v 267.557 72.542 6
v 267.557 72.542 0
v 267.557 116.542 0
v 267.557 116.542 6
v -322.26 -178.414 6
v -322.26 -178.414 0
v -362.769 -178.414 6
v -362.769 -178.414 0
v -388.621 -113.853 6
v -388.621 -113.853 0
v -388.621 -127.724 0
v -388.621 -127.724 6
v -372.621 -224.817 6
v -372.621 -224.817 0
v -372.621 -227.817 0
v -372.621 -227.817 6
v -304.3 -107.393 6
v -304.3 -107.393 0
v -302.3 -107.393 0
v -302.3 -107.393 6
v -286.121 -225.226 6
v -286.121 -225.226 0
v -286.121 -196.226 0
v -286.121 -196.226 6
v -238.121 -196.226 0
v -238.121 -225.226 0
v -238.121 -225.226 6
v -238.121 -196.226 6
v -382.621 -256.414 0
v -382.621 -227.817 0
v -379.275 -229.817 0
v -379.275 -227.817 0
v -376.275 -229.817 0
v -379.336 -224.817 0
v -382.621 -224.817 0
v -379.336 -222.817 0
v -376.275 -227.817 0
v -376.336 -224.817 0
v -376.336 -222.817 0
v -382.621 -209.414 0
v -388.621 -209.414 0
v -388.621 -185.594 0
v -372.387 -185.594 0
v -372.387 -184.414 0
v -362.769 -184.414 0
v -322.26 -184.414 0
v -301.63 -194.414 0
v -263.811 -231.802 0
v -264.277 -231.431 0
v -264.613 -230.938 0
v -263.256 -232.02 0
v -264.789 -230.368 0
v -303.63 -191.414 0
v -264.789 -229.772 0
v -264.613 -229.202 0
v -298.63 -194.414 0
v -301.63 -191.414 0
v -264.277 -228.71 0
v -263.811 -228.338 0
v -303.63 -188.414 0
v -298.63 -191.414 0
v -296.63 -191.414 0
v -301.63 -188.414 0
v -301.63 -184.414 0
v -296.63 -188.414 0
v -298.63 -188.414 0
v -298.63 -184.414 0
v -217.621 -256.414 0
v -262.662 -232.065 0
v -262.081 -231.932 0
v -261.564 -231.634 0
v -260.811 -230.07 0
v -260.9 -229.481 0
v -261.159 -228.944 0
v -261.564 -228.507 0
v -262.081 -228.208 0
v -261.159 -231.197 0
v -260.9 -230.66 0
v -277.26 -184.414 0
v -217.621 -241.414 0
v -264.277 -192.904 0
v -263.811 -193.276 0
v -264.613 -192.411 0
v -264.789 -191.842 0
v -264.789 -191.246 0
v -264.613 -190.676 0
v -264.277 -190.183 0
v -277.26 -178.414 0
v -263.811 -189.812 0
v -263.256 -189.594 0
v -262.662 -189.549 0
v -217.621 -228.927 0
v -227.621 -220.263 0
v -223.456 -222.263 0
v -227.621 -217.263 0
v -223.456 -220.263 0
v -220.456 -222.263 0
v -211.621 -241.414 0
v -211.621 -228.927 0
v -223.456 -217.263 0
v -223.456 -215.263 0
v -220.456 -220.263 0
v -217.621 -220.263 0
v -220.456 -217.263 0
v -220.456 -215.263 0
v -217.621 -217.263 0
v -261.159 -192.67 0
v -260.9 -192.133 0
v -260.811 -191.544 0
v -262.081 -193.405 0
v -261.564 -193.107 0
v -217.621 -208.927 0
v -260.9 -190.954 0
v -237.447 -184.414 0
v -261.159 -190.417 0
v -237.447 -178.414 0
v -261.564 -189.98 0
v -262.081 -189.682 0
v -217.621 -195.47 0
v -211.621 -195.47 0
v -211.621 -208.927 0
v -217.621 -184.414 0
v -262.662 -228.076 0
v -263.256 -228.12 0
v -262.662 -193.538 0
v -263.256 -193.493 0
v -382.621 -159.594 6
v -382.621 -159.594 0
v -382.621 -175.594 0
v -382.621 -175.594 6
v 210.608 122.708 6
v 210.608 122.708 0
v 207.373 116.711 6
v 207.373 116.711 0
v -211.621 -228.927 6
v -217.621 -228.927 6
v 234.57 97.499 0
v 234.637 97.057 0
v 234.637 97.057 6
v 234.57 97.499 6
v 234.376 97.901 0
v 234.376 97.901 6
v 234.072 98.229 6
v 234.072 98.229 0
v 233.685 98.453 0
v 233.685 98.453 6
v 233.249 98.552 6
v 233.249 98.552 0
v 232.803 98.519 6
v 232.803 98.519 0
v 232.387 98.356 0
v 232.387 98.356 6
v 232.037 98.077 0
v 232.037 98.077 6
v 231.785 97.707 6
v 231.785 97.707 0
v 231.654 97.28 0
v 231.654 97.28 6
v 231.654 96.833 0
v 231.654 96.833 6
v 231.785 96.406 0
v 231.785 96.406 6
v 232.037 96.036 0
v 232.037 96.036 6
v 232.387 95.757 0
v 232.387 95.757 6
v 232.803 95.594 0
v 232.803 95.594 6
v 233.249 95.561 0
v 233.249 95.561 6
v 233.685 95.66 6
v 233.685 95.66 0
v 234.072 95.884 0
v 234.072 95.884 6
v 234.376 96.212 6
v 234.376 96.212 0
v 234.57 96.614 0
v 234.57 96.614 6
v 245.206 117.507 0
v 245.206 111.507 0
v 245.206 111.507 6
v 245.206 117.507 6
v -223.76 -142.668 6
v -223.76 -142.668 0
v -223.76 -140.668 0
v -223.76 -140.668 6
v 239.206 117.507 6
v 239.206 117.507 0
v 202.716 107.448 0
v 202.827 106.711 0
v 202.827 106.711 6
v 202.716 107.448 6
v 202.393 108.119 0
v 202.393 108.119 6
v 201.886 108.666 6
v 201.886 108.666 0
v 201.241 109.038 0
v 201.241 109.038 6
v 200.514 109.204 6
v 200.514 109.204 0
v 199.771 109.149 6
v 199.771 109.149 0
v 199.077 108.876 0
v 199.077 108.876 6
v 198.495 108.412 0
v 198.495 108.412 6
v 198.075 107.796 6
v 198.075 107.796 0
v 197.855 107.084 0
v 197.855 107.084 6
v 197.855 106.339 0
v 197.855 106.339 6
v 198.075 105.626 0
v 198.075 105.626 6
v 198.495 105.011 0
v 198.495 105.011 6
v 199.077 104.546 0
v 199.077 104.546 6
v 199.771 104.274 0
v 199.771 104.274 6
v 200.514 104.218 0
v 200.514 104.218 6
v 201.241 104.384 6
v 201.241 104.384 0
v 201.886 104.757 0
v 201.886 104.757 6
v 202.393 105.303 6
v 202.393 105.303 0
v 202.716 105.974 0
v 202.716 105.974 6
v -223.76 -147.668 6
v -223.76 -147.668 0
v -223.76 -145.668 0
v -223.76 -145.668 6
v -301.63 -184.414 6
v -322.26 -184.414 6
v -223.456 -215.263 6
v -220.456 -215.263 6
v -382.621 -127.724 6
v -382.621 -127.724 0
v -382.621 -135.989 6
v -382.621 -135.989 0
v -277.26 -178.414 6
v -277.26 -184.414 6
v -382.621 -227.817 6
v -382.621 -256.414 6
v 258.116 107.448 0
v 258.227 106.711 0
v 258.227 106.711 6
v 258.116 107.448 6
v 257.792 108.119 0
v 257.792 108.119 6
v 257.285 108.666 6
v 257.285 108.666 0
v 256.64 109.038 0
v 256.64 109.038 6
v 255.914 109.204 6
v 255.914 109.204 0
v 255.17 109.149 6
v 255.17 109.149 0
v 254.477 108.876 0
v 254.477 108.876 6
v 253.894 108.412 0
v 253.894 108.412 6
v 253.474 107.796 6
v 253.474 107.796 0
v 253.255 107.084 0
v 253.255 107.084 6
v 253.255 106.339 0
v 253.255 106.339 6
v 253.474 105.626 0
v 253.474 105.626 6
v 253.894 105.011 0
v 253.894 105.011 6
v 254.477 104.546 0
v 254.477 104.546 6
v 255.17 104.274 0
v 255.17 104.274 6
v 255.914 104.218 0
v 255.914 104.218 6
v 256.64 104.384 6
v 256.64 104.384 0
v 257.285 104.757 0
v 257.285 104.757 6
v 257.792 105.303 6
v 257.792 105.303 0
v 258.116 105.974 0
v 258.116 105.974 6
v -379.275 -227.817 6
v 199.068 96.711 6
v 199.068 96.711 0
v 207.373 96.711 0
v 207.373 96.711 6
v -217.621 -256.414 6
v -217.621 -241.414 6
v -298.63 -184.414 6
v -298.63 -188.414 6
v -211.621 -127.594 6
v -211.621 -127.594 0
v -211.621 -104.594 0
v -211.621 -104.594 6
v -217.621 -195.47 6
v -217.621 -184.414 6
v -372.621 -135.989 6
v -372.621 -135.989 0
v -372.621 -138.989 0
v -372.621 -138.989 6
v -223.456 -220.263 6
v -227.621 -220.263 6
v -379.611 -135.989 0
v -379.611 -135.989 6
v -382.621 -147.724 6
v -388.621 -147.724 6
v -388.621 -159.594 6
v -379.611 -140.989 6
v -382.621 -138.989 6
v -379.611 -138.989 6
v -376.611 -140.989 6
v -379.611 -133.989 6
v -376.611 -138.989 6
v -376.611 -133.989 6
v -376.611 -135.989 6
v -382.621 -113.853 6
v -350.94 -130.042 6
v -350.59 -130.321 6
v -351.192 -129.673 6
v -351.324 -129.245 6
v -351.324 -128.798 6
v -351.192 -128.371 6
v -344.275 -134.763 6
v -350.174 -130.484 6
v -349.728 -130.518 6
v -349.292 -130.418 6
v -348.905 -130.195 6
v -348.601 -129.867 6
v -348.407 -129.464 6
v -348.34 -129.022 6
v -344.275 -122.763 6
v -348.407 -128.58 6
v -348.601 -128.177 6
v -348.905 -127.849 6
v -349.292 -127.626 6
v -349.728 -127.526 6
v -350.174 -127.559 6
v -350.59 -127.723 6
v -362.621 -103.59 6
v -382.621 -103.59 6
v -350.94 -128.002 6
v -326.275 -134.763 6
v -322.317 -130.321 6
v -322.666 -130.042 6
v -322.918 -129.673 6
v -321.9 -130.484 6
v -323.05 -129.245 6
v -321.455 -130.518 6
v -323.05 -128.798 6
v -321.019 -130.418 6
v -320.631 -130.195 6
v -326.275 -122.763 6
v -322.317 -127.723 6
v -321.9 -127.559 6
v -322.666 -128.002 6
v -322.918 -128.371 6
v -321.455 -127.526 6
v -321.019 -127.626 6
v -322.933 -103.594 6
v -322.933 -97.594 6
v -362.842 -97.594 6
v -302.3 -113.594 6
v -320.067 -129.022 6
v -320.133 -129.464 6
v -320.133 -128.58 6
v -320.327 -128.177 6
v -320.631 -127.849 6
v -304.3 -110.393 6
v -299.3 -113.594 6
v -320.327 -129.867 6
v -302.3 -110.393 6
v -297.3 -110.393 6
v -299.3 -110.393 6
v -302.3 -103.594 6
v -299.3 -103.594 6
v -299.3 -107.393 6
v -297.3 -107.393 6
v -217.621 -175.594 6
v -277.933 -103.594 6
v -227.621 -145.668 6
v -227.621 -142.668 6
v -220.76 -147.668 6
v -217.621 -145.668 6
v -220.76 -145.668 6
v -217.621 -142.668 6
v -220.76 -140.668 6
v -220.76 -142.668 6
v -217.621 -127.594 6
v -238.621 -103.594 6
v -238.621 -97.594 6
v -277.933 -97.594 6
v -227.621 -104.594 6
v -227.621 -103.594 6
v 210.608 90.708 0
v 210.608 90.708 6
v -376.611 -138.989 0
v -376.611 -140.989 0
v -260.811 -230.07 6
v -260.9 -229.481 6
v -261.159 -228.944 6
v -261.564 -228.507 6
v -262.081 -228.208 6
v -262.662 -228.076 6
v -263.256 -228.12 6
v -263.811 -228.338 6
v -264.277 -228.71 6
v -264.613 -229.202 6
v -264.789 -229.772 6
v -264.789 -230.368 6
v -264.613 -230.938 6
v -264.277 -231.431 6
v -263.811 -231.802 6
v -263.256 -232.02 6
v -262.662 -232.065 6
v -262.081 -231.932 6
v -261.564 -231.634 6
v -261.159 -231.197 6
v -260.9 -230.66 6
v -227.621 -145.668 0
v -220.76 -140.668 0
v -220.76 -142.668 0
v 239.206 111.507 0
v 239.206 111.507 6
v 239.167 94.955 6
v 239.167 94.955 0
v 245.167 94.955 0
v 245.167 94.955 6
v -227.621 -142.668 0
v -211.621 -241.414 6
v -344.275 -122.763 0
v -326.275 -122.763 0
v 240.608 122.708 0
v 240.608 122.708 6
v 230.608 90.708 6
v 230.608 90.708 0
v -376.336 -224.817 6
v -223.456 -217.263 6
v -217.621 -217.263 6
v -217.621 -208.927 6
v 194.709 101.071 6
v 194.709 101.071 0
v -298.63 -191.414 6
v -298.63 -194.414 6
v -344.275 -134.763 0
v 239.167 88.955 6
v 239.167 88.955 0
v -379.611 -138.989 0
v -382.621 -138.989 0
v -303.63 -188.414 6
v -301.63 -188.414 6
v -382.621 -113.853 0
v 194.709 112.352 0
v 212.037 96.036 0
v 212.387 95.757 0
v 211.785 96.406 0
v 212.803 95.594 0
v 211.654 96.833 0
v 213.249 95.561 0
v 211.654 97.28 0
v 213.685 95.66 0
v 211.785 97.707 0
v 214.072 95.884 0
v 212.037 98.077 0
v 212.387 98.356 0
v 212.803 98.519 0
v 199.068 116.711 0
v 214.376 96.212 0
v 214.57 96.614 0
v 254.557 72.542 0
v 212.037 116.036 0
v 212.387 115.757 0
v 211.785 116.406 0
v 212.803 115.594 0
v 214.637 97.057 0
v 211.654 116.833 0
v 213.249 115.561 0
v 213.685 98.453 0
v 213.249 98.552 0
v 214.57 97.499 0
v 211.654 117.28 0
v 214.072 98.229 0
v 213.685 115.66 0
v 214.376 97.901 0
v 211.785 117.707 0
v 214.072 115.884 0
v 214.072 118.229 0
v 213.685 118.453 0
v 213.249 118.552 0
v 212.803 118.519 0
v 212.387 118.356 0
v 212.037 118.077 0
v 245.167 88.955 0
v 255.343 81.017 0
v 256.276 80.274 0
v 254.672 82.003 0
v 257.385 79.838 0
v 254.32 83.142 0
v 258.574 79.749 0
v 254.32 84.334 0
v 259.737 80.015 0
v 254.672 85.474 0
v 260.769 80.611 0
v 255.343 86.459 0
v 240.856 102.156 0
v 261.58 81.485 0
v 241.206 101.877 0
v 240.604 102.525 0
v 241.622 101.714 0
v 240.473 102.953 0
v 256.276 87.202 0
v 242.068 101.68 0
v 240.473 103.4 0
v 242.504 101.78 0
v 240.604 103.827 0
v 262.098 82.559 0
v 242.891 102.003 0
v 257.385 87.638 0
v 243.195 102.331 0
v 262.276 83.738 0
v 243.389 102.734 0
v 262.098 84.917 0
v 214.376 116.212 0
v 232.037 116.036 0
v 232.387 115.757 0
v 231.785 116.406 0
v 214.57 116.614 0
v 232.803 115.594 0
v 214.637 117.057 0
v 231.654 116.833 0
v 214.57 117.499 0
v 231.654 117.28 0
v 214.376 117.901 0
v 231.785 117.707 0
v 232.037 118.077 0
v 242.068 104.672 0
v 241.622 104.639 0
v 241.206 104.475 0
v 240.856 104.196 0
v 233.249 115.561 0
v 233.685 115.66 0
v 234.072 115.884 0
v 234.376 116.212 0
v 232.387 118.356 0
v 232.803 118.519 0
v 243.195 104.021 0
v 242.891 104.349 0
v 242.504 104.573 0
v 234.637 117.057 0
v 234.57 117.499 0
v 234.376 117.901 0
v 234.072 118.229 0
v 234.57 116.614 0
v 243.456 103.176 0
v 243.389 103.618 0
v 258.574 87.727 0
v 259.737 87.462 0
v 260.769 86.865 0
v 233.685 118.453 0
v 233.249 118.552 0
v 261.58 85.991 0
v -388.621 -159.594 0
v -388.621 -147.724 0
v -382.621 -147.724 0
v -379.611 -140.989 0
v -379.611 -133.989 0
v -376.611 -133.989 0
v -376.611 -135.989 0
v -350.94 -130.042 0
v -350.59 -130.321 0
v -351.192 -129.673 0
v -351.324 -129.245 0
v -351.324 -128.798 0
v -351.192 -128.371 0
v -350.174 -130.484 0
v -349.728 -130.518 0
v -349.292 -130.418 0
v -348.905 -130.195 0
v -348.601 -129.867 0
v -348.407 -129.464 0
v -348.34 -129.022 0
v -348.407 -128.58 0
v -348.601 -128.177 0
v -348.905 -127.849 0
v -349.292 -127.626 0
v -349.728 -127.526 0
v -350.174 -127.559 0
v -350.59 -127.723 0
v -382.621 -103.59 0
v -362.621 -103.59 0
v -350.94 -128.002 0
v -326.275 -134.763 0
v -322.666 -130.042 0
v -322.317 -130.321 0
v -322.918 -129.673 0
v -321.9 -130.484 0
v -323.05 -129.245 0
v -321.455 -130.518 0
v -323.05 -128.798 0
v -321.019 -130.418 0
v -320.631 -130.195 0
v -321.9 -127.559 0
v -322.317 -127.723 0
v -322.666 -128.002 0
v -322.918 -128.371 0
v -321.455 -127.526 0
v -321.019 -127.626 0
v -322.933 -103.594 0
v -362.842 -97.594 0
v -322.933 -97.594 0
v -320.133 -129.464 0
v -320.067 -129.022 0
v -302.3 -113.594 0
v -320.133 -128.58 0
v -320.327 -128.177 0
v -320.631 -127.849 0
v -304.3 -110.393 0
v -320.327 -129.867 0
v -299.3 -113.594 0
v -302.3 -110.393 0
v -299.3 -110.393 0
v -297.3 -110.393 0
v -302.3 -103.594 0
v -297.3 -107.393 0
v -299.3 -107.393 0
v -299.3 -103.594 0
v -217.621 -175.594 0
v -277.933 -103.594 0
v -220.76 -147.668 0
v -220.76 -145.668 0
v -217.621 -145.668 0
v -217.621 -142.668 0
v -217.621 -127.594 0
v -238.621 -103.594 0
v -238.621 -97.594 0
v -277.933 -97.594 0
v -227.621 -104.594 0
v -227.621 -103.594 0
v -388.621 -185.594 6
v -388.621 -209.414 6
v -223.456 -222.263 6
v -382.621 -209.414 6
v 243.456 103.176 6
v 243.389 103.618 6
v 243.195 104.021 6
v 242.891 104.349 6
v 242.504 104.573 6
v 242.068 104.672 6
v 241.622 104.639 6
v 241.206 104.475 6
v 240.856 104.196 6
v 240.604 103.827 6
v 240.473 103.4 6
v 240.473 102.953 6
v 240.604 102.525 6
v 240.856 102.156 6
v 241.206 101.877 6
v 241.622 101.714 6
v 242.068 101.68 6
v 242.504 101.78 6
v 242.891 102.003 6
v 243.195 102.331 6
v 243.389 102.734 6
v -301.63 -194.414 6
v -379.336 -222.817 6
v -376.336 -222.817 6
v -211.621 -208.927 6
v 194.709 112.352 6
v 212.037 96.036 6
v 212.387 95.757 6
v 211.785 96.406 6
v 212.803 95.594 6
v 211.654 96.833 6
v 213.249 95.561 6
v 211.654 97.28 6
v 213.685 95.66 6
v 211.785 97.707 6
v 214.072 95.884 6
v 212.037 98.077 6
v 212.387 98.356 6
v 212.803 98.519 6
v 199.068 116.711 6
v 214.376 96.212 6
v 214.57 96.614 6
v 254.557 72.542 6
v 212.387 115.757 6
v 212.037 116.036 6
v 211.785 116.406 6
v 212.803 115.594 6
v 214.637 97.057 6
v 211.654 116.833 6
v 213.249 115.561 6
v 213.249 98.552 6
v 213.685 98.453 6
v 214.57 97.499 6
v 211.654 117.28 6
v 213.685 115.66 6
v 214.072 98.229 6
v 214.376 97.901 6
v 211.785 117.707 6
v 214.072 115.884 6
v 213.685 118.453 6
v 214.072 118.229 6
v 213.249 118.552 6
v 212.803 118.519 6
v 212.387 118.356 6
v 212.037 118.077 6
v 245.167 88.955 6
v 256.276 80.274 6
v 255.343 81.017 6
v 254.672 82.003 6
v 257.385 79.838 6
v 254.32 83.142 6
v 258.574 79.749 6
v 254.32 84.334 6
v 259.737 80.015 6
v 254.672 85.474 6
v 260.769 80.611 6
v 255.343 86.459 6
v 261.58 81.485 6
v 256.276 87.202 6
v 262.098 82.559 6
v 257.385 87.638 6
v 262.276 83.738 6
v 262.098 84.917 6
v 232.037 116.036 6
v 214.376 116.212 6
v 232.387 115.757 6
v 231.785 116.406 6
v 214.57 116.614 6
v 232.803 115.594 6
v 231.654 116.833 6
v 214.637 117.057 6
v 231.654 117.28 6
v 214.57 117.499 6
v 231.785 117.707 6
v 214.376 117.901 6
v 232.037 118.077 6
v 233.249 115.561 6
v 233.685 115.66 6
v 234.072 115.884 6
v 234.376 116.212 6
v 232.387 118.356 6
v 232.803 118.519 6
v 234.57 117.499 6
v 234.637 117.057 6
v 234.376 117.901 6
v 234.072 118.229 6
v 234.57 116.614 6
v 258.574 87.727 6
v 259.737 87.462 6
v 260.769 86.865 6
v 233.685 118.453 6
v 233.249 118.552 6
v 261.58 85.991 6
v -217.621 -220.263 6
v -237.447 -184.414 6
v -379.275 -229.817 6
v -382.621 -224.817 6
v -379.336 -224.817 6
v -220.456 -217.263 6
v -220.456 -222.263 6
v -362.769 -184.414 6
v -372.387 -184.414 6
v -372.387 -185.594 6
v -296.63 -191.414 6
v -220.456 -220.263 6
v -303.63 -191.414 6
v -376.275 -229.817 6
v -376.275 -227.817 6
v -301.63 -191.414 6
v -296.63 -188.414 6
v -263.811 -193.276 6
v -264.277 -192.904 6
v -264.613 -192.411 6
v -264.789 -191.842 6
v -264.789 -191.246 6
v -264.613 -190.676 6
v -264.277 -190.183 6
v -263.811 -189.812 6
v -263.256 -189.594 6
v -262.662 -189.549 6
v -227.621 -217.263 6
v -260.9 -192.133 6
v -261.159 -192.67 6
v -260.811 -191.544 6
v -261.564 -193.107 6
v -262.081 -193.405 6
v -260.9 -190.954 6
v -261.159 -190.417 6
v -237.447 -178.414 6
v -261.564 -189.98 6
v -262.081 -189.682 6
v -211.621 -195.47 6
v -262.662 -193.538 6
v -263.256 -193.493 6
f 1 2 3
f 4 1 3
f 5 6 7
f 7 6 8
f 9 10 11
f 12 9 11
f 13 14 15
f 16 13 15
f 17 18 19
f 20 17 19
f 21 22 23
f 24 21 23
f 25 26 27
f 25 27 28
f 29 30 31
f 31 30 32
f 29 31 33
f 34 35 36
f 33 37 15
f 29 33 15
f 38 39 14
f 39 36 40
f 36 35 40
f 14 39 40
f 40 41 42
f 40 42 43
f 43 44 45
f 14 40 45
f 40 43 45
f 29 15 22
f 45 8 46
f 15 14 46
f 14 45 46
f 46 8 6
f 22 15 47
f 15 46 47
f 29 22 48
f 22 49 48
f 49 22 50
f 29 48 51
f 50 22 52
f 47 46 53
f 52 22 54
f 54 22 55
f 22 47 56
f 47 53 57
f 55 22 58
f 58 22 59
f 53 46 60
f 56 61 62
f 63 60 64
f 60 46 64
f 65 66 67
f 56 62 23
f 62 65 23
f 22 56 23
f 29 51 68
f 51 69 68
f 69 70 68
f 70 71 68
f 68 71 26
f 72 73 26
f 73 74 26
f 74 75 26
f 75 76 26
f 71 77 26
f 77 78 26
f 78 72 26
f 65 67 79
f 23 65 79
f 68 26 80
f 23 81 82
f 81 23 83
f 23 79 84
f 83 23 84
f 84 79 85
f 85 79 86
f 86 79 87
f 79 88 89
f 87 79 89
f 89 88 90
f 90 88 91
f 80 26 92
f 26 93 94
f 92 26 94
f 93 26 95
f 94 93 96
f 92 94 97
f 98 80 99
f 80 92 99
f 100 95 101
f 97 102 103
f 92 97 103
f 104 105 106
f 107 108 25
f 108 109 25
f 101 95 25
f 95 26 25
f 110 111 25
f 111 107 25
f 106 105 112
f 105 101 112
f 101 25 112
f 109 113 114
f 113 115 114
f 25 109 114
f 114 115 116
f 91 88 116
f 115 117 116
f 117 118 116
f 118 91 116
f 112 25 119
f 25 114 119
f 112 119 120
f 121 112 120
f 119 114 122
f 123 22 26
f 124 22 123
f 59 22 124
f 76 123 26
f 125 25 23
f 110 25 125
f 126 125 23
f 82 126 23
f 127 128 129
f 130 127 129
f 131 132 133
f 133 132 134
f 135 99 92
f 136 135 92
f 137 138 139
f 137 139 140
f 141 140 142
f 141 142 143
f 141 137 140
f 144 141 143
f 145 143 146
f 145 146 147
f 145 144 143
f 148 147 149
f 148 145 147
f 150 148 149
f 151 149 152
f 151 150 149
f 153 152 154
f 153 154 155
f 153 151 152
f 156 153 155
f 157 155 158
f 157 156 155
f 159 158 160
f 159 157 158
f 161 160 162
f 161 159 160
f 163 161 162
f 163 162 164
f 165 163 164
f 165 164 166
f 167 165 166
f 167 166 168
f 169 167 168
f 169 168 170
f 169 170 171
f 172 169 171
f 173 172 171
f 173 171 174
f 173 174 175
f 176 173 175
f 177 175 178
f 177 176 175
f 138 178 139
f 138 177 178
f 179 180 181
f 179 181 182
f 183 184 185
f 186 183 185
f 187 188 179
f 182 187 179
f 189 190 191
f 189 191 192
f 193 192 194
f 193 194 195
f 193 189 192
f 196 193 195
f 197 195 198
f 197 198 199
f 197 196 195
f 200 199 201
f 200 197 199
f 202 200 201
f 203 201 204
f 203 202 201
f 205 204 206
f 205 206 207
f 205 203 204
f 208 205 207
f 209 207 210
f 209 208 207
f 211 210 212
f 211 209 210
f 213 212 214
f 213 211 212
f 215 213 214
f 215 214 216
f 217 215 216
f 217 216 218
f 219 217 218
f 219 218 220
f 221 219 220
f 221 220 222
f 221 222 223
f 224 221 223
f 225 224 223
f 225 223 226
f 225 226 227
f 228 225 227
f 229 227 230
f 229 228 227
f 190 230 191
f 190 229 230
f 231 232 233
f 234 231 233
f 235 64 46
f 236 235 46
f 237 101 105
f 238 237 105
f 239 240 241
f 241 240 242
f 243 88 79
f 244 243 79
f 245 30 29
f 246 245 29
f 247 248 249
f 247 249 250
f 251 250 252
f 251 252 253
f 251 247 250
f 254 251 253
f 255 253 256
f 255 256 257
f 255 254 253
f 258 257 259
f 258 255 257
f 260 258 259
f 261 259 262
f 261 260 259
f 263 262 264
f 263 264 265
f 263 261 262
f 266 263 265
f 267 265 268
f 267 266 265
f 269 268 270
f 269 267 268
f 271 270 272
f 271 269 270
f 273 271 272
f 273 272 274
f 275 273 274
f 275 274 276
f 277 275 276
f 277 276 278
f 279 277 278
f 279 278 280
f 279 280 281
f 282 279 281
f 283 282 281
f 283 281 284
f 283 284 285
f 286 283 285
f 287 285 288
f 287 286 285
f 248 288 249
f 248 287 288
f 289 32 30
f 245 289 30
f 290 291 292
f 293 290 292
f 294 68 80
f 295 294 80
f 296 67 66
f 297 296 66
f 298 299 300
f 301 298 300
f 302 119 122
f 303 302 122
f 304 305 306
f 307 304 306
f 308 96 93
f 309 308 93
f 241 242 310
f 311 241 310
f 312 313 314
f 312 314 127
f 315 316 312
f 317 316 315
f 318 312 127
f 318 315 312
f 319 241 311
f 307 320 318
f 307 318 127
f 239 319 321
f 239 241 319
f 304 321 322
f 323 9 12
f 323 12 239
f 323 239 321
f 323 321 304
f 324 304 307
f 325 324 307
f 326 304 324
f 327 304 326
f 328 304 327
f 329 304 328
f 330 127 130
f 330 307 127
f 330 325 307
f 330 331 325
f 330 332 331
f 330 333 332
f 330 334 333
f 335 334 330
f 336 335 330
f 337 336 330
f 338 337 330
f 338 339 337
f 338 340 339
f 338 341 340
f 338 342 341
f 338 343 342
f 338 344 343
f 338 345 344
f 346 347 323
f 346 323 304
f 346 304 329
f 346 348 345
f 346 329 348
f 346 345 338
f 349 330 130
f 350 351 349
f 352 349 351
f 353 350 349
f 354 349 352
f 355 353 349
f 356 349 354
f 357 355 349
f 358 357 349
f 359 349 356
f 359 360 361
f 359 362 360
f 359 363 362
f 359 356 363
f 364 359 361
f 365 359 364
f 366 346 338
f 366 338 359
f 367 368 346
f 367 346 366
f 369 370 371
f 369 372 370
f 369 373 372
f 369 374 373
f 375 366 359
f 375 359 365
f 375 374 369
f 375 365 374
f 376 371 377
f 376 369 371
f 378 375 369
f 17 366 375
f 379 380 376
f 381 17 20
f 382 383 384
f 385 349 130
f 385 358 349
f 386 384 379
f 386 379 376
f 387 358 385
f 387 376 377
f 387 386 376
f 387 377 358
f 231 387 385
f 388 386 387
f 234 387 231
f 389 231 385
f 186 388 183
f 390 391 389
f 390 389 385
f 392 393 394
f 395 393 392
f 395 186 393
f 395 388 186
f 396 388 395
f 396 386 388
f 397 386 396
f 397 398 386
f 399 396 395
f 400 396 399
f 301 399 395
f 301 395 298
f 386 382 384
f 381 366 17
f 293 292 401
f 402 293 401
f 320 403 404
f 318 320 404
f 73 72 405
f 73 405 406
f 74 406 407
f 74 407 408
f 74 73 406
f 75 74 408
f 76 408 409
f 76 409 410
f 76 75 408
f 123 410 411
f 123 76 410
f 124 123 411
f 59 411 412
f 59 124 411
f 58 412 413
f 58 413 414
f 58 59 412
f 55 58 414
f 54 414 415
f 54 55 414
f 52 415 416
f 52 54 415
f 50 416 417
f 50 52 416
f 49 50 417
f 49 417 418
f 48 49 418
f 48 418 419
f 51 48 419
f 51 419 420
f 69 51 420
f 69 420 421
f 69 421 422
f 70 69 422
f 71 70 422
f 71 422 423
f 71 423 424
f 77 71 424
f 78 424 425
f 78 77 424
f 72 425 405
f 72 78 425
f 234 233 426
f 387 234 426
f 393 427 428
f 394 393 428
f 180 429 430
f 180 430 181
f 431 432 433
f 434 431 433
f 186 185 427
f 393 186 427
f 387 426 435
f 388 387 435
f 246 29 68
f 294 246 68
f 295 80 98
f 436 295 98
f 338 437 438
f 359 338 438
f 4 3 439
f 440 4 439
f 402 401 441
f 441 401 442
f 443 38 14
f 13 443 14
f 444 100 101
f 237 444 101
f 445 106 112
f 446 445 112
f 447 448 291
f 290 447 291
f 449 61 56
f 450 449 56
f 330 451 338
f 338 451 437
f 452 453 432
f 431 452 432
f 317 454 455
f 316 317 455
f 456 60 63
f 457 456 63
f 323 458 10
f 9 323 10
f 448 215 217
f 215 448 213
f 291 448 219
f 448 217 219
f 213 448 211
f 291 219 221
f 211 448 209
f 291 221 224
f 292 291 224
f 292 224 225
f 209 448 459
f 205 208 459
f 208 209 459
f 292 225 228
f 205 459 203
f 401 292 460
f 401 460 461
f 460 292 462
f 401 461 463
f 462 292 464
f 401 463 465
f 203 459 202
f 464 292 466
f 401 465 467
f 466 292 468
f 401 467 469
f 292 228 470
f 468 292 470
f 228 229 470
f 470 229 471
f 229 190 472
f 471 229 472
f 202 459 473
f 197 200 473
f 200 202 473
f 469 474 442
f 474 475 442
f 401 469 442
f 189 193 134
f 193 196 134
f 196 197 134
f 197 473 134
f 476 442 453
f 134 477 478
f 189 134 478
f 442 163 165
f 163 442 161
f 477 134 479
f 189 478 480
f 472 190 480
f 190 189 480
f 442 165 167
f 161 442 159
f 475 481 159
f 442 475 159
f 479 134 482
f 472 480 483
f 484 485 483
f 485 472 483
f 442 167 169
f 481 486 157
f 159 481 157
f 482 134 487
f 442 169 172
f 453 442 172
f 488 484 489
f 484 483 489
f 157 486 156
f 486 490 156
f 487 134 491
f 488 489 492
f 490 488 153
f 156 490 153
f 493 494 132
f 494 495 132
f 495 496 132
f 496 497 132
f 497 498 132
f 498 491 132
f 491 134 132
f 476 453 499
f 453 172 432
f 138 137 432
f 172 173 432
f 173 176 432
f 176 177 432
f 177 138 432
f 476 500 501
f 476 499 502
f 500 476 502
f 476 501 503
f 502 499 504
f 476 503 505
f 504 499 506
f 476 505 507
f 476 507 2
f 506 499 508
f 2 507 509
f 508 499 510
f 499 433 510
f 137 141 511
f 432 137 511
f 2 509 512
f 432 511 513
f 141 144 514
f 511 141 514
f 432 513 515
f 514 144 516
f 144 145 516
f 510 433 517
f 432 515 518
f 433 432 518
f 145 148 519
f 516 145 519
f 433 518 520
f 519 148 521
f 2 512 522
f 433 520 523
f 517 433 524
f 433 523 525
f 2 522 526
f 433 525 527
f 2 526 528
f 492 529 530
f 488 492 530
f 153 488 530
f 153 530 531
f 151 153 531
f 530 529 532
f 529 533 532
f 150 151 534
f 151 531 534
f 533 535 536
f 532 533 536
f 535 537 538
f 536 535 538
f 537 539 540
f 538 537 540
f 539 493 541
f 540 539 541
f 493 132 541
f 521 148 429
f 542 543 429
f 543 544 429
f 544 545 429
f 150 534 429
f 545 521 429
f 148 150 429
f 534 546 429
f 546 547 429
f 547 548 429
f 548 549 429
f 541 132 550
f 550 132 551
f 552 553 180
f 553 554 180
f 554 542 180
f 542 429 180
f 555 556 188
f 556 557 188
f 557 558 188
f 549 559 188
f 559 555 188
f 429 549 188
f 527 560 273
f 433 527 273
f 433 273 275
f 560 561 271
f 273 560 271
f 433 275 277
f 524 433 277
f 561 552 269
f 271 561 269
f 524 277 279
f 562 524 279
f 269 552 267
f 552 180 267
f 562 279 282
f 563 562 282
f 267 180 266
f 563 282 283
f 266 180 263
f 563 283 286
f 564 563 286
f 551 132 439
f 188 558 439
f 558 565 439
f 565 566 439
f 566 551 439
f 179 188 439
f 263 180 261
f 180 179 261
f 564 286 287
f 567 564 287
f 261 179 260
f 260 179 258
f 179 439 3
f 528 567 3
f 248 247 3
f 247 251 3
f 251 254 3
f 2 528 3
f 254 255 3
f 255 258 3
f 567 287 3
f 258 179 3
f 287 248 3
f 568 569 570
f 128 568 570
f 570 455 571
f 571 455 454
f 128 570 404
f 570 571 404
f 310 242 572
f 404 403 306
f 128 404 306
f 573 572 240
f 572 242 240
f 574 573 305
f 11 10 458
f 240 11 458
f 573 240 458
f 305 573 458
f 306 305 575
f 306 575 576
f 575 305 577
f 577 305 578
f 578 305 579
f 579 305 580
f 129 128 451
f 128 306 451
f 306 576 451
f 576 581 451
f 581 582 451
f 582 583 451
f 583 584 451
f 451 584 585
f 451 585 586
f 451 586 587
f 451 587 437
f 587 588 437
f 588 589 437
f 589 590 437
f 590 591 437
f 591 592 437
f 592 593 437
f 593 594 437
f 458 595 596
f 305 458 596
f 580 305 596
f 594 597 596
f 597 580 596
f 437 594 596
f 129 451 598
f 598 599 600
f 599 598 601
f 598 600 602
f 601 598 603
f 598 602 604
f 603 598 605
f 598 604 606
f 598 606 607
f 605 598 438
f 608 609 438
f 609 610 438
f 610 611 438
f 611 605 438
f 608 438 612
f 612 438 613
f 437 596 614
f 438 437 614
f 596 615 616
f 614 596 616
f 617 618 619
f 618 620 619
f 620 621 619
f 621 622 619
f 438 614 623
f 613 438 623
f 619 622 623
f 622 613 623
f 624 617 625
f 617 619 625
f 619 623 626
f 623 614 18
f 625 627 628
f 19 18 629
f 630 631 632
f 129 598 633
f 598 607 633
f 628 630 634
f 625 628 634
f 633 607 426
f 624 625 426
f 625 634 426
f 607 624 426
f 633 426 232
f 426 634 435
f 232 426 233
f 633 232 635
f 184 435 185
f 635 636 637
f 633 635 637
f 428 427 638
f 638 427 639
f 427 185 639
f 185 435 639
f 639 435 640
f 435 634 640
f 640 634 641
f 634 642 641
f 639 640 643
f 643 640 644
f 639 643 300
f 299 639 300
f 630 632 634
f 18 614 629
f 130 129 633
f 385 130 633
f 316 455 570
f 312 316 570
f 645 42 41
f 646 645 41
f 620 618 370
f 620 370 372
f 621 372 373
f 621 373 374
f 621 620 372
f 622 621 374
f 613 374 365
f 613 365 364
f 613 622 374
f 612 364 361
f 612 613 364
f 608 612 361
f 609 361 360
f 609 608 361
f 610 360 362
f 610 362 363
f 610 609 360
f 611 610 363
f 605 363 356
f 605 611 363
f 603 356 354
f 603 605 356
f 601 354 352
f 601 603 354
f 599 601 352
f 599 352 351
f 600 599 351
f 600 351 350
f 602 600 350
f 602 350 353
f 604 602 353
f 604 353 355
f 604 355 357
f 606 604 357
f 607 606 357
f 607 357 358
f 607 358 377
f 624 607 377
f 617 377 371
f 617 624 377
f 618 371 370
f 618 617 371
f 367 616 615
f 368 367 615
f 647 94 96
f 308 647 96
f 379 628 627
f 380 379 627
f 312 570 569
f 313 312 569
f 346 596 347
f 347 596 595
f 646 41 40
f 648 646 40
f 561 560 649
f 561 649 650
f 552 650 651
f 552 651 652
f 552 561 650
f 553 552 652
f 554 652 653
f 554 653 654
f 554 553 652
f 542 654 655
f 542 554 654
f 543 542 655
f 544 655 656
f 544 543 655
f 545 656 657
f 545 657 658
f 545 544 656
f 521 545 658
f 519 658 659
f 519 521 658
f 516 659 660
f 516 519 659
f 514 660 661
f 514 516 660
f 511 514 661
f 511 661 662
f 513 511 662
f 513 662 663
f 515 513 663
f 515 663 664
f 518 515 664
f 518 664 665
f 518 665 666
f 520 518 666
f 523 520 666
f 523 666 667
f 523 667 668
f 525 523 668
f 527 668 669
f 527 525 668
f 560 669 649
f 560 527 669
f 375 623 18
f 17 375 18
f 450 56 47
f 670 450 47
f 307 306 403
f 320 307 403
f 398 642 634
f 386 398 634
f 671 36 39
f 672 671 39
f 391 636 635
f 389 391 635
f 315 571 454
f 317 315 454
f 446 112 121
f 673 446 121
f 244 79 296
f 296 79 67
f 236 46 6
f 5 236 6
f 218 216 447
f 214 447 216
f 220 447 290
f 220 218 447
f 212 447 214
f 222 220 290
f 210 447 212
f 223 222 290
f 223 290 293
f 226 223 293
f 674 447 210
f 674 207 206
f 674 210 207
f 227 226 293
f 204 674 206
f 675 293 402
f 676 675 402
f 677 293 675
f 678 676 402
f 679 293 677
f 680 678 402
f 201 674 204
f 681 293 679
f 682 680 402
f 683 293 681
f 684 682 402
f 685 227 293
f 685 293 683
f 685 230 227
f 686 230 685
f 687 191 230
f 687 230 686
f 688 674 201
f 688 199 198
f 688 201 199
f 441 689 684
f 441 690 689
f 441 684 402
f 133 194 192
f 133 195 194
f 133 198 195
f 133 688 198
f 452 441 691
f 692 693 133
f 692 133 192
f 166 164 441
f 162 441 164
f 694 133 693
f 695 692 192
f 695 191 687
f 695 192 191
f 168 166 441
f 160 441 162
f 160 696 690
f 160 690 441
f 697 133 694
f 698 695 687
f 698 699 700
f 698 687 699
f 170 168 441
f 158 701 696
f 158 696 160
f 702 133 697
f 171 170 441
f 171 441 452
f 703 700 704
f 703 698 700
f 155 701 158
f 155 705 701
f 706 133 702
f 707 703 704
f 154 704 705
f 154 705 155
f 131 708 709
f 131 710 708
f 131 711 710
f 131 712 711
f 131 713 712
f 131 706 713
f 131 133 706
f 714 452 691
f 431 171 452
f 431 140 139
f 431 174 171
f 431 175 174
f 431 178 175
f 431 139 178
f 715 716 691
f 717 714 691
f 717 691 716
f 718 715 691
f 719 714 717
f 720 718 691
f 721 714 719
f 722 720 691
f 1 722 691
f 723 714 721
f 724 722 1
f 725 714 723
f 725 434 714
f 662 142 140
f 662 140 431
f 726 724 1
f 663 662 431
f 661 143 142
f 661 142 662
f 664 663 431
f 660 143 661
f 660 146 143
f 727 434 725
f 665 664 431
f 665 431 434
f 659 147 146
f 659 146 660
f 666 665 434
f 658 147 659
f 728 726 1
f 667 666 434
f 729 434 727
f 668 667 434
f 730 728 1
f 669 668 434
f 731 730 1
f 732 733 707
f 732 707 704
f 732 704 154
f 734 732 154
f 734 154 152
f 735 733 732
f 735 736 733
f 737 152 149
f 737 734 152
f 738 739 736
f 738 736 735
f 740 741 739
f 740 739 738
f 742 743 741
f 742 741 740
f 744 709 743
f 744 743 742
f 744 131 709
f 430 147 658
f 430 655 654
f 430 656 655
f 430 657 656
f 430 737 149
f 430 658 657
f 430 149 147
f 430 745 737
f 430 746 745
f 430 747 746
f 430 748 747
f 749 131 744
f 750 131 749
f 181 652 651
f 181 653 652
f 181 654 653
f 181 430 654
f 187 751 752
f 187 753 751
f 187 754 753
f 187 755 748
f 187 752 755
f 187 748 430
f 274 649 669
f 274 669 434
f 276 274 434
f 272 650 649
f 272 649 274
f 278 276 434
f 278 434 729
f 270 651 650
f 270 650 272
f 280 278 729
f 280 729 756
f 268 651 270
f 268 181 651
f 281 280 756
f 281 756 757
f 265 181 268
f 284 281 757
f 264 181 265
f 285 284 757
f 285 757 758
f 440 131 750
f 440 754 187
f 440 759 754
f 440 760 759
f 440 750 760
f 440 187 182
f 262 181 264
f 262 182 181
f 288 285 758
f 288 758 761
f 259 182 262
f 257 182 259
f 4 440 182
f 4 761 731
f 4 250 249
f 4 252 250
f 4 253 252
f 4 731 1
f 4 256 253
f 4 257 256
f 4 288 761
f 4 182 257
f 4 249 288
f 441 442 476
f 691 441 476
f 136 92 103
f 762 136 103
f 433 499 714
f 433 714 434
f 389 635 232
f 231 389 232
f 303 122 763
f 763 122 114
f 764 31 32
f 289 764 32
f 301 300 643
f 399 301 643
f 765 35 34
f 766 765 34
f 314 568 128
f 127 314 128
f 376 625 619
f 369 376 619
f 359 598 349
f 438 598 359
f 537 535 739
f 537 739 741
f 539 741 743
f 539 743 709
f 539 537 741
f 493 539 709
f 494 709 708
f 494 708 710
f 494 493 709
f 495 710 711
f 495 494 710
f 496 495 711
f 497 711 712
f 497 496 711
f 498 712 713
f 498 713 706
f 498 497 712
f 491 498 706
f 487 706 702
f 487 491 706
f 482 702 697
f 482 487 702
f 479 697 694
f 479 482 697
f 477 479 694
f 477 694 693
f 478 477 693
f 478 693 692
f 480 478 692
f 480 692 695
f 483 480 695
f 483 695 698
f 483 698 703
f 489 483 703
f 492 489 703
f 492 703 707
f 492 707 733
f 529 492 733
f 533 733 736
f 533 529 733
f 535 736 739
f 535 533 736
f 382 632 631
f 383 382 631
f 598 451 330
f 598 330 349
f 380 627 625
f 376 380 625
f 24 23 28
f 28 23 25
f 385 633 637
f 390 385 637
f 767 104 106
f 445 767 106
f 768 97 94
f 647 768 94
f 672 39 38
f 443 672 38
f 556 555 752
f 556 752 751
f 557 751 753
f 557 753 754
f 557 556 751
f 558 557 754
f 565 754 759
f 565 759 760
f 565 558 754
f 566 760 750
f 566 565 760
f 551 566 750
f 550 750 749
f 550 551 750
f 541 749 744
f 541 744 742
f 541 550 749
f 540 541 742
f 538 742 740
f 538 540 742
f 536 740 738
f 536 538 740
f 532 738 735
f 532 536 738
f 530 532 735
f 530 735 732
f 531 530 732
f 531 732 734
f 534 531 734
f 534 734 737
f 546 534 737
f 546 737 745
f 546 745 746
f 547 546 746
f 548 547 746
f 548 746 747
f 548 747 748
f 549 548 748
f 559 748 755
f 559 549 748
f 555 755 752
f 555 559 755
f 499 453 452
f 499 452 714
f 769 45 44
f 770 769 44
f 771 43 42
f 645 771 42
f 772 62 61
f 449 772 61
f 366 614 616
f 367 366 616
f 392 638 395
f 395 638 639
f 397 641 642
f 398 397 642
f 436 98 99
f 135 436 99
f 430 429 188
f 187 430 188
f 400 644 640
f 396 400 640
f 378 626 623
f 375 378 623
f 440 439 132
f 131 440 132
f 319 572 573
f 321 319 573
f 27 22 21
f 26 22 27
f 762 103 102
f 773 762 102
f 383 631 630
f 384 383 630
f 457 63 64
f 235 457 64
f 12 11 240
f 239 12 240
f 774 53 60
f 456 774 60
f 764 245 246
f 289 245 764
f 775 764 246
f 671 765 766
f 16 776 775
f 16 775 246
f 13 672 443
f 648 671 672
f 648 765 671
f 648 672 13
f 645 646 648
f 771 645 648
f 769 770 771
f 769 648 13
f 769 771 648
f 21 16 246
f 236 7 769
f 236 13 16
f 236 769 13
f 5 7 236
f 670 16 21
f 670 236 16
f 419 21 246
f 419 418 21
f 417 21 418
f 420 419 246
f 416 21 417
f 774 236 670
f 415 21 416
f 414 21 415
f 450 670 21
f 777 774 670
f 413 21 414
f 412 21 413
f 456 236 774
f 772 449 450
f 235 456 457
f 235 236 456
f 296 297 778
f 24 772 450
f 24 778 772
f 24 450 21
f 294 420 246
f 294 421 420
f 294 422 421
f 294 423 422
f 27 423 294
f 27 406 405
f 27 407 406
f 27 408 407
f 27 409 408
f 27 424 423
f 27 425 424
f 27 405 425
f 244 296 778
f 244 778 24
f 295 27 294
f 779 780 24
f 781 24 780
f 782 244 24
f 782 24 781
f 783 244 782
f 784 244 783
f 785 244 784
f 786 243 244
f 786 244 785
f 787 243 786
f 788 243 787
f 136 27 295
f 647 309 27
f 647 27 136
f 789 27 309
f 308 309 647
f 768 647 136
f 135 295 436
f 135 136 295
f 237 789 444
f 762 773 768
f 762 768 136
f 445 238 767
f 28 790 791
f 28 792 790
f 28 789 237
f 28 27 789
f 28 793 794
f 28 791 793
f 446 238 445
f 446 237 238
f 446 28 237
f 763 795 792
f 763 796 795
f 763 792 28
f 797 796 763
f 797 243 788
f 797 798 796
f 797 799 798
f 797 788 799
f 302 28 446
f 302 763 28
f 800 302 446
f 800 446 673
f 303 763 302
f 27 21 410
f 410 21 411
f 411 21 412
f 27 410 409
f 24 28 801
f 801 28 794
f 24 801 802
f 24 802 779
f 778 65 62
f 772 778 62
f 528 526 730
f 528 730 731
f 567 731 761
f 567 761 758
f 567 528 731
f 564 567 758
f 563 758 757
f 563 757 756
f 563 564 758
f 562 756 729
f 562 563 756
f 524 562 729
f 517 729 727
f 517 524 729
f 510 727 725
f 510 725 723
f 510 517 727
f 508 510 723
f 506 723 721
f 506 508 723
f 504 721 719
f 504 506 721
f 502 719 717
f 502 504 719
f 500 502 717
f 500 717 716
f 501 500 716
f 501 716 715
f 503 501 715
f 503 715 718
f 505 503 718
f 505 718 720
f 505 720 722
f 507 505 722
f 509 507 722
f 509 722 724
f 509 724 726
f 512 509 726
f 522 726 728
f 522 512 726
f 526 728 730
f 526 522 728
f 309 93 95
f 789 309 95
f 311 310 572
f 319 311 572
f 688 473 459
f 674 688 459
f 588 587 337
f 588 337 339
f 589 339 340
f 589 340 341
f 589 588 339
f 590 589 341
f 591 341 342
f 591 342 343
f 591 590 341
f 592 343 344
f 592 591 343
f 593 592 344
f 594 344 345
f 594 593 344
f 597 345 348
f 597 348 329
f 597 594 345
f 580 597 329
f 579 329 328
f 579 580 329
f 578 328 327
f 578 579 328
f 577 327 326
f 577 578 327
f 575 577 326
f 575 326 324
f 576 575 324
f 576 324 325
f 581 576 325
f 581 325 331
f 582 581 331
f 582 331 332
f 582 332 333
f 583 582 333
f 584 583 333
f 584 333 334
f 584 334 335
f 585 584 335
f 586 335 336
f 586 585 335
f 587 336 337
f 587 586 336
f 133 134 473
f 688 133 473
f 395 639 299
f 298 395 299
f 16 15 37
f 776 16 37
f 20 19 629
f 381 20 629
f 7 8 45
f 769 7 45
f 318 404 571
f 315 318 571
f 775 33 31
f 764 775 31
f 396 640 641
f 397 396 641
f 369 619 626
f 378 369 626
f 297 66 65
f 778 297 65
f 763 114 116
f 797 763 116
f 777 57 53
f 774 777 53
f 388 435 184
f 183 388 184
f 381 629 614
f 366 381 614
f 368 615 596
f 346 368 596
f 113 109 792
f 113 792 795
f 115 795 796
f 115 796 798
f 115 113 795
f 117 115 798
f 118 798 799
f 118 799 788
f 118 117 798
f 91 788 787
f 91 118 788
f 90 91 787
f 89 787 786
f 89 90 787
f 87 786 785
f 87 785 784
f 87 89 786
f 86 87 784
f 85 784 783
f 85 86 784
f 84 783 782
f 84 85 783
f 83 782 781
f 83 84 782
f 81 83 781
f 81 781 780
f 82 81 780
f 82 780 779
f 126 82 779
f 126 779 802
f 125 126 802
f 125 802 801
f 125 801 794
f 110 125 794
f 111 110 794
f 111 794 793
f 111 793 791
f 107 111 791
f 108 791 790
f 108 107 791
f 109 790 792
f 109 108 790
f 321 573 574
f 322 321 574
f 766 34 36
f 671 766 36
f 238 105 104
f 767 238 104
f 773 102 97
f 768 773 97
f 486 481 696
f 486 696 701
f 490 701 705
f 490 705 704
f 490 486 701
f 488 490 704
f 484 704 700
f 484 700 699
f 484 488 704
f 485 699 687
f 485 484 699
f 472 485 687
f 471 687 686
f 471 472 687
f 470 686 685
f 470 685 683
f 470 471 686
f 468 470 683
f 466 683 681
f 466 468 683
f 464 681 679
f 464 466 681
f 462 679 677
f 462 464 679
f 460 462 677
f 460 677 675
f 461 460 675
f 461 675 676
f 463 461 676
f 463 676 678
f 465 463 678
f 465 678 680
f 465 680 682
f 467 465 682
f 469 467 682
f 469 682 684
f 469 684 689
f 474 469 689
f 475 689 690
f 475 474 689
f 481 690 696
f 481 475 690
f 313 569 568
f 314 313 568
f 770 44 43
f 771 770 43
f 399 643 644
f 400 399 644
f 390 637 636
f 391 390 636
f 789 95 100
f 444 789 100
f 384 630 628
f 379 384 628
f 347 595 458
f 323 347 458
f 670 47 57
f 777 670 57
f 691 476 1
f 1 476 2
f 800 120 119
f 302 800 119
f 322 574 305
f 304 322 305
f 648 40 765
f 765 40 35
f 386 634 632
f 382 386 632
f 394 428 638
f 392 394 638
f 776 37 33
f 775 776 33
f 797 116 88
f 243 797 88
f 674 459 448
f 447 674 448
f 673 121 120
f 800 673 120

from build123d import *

# Parameters (mm, degrees)
F0_R     = 2
F0_W     = 48
F0_H     = 29
F1_DEPTH = 6
F0_R_2   = 1.5
F0_W_2   = 18
F0_H_2   = 12
F2_DEPTH = 6
F0_R_3   = 4
F0_W_3   = 6
F0_H_3   = 6
F0_R_4   = 2.5
F3_DEPTH = 6


# Not quite as in the source:
# - a feature of the source that left no trace in its solid (it failed there, or was rolled back) is left out


with BuildPart() as f1:
    # F0 (on Top) → F1 (new body)
    with BuildSketch(Plane.XY):
        Polygon((-322.260171175, -178.4142817259), (-362.7690343857, -178.4142817259), (-362.7690343857, -184.4142817259), (-372.3870515823, -184.4142817259), (-372.3870515823, -185.5936968327), (-388.6211997944, -185.5936968327), (-388.6211997944, -209.4142817259), (-382.6211997944, -209.4142817259), (-382.6211997944, -224.8172610998), (-379.3355226517, -224.8172610998), (-379.3355226517, -222.8172610998), (-376.3355226517, -222.8172610998), (-376.3355226517, -224.8172610998), (-372.6211997944, -224.8172610998), (-372.6211997944, -227.8172610998), (-376.2749941349, -227.8172610998), (-376.2749941349, -229.8172610998), (-379.2749941349, -229.8172610998), (-379.2749941349, -227.8172610998), (-382.6211997944, -227.8172610998), (-382.6211997944, -256.4142817259), (-217.6211997944, -256.4142817259), (-217.6211997944, -241.4142817259), (-211.6211997944, -241.4142817259), (-211.6211997944, -228.9265096188), (-217.6211997944, -228.9265096188), (-217.6211997944, -220.2628701925), (-220.4560786486, -220.2628701925), (-220.4560786486, -222.2628701925), (-223.4560786486, -222.2628701925), (-223.4560786486, -220.2628701925), (-227.6211997944, -220.2628701925), (-227.6211997944, -217.2628701925), (-223.4560786486, -217.2628701925), (-223.4560786486, -215.2628701925), (-220.4560786486, -215.2628701925), (-220.4560786486, -217.2628701925), (-217.6211997944, -217.2628701925), (-217.6211997944, -208.9265096188), (-211.6211997944, -208.9265096188), (-211.6211997944, -195.4697817564), (-217.6211997944, -195.4697817564), (-217.6211997944, -184.4142817259), (-237.4467253685, -184.4142817259), (-237.4467253685, -178.4142817259), (-277.260171175, -178.4142817259), (-277.260171175, -184.4142817259), (-298.62987113, -184.4142817259), (-298.62987113, -188.4142817259), (-296.62987113, -188.4142817259), (-296.62987113, -191.4142817259), (-298.62987113, -191.4142817259), (-298.62987113, -194.4142817259), (-301.62987113, -194.4142817259), (-301.62987113, -191.4142817259), (-303.62987113, -191.4142817259), (-303.62987113, -188.4142817259), (-301.62987113, -188.4142817259), (-301.62987113, -184.4142817259), (-322.260171175, -184.4142817259), align=None)
        with Locations((-262.8113031387, -230.070233345)):
            Circle(F0_R, mode=Mode.SUBTRACT)
        with Locations((-262.1210625172, -210.7260148525)):
            Rectangle(F0_W, F0_H, mode=Mode.SUBTRACT)
        with Locations((-262.8113031387, -191.5435940027)):
            Circle(F0_R, mode=Mode.SUBTRACT)
    extrude(amount=F1_DEPTH)


with BuildPart() as f2:
    # F0 (on Top) → F2 (new body)
    with BuildSketch(Plane.XY):
        Polygon((-322.9325413704, -97.594037652), (-362.841963768, -97.594037652), (-362.6211997944, -103.5899748822), (-382.6211997944, -103.5899748822), (-382.6211997944, -113.8526499271), (-388.6211997944, -113.8526499271), (-388.6211997944, -127.7235001326), (-382.6211997944, -127.7235001326), (-382.6211997944, -135.98858428), (-379.6105473042, -135.98858428), (-379.6105473042, -133.98858428), (-376.6105473042, -133.98858428), (-376.6105473042, -135.98858428), (-372.6211997944, -135.98858428), (-372.6211997944, -138.98858428), (-376.6105473042, -138.98858428), (-376.6105473042, -140.98858428), (-379.6105473042, -140.98858428), (-379.6105473042, -138.98858428), (-382.6211997944, -138.98858428), (-382.6211997944, -147.7235001326), (-388.6211997944, -147.7235001326), (-388.6211997944, -159.594037652), (-382.6211997944, -159.594037652), (-382.6211997944, -175.594037652), (-217.6211997944, -175.594037652), (-217.6211997944, -145.6676274538), (-220.7599878311, -145.6676274538), (-220.7599878311, -147.6676274538), (-223.7599878311, -147.6676274538), (-223.7599878311, -145.6676274538), (-227.6211997944, -145.6676274538), (-227.6211997944, -142.6676274538), (-223.7599878311, -142.6676274538), (-223.7599878311, -140.6676274538), (-220.7599878311, -140.6676274538), (-220.7599878311, -142.6676274538), (-217.6211997944, -142.6676274538), (-217.6211997944, -127.594037652), (-211.6211997944, -127.594037652), (-211.6211997944, -104.594037652), (-227.6211997944, -104.594037652), (-227.6211997944, -103.594037652), (-238.6211997944, -103.594037652), (-238.6211997944, -97.594037652), (-277.9325413704, -97.594037652), (-277.9325413704, -103.594037652), (-299.3002493382, -103.594037652), (-299.3002493382, -107.3925257921), (-297.3002493382, -107.3925257921), (-297.3002493382, -110.3925257921), (-299.3002493382, -110.3925257921), (-299.3002493382, -113.594037652), (-302.3002493382, -113.594037652), (-302.3002493382, -110.3925257921), (-304.3002493382, -110.3925257921), (-304.3002493382, -107.3925257921), (-302.3002493382, -107.3925257921), (-302.3002493382, -103.594037652), (-322.9325413704, -103.594037652), align=None)
        with Locations((-349.8402833939, -129.0218681097)):
            Circle(F0_R_2, mode=Mode.SUBTRACT)
        with Locations((-335.2745141983, -128.7626596689)):
            Rectangle(F0_W_2, F0_H_2, mode=Mode.SUBTRACT)
        with Locations((-321.5666413307, -129.0218681097)):
            Circle(F0_R_2, mode=Mode.SUBTRACT)
    extrude(amount=F2_DEPTH)


with BuildPart() as f3:
    # F0 (on Top) → F3 (new body)
    with BuildSketch(Plane.XY):
        Polygon((240.6081428044, 122.7075162329), (210.6081428044, 122.7075162329), (207.3727697134, 116.7111811042), (199.0681737661, 116.7111811042), (194.7087794542, 112.3517867923), (194.7087794542, 101.0705754161), (199.0681737661, 96.7111811042), (207.3727697134, 96.7111811042), (210.6081428044, 90.7075162329), (230.6081428044, 90.7075162329), (254.5574009418, 72.5415870547), (267.5574009418, 72.5415870547), (267.5574009418, 116.5415870547), align=None)
        with Locations((213.1369262934, 97.0565155149)):
            Circle(F0_R_2, mode=Mode.SUBTRACT)
        with Locations((258.2755386829, 83.7381631136)):
            Circle(F0_R_3, mode=Mode.SUBTRACT)
        with Locations((242.166555047, 91.9554172754)):
            Rectangle(F0_W_3, F0_H_3, mode=Mode.SUBTRACT)
        with Locations((233.1369262934, 97.0565155149)):
            Circle(F0_R_2, mode=Mode.SUBTRACT)
        with Locations((200.3271728754, 106.7111811042)):
            Circle(F0_R_4, mode=Mode.SUBTRACT)
        with Locations((213.1369262934, 117.0565155149)):
            Circle(F0_R_2, mode=Mode.SUBTRACT)
        with Locations((241.9558465481, 103.1761914492)):
            Circle(F0_R_2, mode=Mode.SUBTRACT)
        with Locations((255.7267546654, 106.7111811042)):
            Circle(F0_R_4, mode=Mode.SUBTRACT)
        with Locations((242.2060729265, 114.5068718791)):
            Rectangle(F0_W_3, F0_H_3, mode=Mode.SUBTRACT)
        with Locations((233.1369262934, 117.0565155149)):
            Circle(F0_R_2, mode=Mode.SUBTRACT)
    extrude(amount=F3_DEPTH)


solid = Compound([f1.part, f2.part, f3.part])
